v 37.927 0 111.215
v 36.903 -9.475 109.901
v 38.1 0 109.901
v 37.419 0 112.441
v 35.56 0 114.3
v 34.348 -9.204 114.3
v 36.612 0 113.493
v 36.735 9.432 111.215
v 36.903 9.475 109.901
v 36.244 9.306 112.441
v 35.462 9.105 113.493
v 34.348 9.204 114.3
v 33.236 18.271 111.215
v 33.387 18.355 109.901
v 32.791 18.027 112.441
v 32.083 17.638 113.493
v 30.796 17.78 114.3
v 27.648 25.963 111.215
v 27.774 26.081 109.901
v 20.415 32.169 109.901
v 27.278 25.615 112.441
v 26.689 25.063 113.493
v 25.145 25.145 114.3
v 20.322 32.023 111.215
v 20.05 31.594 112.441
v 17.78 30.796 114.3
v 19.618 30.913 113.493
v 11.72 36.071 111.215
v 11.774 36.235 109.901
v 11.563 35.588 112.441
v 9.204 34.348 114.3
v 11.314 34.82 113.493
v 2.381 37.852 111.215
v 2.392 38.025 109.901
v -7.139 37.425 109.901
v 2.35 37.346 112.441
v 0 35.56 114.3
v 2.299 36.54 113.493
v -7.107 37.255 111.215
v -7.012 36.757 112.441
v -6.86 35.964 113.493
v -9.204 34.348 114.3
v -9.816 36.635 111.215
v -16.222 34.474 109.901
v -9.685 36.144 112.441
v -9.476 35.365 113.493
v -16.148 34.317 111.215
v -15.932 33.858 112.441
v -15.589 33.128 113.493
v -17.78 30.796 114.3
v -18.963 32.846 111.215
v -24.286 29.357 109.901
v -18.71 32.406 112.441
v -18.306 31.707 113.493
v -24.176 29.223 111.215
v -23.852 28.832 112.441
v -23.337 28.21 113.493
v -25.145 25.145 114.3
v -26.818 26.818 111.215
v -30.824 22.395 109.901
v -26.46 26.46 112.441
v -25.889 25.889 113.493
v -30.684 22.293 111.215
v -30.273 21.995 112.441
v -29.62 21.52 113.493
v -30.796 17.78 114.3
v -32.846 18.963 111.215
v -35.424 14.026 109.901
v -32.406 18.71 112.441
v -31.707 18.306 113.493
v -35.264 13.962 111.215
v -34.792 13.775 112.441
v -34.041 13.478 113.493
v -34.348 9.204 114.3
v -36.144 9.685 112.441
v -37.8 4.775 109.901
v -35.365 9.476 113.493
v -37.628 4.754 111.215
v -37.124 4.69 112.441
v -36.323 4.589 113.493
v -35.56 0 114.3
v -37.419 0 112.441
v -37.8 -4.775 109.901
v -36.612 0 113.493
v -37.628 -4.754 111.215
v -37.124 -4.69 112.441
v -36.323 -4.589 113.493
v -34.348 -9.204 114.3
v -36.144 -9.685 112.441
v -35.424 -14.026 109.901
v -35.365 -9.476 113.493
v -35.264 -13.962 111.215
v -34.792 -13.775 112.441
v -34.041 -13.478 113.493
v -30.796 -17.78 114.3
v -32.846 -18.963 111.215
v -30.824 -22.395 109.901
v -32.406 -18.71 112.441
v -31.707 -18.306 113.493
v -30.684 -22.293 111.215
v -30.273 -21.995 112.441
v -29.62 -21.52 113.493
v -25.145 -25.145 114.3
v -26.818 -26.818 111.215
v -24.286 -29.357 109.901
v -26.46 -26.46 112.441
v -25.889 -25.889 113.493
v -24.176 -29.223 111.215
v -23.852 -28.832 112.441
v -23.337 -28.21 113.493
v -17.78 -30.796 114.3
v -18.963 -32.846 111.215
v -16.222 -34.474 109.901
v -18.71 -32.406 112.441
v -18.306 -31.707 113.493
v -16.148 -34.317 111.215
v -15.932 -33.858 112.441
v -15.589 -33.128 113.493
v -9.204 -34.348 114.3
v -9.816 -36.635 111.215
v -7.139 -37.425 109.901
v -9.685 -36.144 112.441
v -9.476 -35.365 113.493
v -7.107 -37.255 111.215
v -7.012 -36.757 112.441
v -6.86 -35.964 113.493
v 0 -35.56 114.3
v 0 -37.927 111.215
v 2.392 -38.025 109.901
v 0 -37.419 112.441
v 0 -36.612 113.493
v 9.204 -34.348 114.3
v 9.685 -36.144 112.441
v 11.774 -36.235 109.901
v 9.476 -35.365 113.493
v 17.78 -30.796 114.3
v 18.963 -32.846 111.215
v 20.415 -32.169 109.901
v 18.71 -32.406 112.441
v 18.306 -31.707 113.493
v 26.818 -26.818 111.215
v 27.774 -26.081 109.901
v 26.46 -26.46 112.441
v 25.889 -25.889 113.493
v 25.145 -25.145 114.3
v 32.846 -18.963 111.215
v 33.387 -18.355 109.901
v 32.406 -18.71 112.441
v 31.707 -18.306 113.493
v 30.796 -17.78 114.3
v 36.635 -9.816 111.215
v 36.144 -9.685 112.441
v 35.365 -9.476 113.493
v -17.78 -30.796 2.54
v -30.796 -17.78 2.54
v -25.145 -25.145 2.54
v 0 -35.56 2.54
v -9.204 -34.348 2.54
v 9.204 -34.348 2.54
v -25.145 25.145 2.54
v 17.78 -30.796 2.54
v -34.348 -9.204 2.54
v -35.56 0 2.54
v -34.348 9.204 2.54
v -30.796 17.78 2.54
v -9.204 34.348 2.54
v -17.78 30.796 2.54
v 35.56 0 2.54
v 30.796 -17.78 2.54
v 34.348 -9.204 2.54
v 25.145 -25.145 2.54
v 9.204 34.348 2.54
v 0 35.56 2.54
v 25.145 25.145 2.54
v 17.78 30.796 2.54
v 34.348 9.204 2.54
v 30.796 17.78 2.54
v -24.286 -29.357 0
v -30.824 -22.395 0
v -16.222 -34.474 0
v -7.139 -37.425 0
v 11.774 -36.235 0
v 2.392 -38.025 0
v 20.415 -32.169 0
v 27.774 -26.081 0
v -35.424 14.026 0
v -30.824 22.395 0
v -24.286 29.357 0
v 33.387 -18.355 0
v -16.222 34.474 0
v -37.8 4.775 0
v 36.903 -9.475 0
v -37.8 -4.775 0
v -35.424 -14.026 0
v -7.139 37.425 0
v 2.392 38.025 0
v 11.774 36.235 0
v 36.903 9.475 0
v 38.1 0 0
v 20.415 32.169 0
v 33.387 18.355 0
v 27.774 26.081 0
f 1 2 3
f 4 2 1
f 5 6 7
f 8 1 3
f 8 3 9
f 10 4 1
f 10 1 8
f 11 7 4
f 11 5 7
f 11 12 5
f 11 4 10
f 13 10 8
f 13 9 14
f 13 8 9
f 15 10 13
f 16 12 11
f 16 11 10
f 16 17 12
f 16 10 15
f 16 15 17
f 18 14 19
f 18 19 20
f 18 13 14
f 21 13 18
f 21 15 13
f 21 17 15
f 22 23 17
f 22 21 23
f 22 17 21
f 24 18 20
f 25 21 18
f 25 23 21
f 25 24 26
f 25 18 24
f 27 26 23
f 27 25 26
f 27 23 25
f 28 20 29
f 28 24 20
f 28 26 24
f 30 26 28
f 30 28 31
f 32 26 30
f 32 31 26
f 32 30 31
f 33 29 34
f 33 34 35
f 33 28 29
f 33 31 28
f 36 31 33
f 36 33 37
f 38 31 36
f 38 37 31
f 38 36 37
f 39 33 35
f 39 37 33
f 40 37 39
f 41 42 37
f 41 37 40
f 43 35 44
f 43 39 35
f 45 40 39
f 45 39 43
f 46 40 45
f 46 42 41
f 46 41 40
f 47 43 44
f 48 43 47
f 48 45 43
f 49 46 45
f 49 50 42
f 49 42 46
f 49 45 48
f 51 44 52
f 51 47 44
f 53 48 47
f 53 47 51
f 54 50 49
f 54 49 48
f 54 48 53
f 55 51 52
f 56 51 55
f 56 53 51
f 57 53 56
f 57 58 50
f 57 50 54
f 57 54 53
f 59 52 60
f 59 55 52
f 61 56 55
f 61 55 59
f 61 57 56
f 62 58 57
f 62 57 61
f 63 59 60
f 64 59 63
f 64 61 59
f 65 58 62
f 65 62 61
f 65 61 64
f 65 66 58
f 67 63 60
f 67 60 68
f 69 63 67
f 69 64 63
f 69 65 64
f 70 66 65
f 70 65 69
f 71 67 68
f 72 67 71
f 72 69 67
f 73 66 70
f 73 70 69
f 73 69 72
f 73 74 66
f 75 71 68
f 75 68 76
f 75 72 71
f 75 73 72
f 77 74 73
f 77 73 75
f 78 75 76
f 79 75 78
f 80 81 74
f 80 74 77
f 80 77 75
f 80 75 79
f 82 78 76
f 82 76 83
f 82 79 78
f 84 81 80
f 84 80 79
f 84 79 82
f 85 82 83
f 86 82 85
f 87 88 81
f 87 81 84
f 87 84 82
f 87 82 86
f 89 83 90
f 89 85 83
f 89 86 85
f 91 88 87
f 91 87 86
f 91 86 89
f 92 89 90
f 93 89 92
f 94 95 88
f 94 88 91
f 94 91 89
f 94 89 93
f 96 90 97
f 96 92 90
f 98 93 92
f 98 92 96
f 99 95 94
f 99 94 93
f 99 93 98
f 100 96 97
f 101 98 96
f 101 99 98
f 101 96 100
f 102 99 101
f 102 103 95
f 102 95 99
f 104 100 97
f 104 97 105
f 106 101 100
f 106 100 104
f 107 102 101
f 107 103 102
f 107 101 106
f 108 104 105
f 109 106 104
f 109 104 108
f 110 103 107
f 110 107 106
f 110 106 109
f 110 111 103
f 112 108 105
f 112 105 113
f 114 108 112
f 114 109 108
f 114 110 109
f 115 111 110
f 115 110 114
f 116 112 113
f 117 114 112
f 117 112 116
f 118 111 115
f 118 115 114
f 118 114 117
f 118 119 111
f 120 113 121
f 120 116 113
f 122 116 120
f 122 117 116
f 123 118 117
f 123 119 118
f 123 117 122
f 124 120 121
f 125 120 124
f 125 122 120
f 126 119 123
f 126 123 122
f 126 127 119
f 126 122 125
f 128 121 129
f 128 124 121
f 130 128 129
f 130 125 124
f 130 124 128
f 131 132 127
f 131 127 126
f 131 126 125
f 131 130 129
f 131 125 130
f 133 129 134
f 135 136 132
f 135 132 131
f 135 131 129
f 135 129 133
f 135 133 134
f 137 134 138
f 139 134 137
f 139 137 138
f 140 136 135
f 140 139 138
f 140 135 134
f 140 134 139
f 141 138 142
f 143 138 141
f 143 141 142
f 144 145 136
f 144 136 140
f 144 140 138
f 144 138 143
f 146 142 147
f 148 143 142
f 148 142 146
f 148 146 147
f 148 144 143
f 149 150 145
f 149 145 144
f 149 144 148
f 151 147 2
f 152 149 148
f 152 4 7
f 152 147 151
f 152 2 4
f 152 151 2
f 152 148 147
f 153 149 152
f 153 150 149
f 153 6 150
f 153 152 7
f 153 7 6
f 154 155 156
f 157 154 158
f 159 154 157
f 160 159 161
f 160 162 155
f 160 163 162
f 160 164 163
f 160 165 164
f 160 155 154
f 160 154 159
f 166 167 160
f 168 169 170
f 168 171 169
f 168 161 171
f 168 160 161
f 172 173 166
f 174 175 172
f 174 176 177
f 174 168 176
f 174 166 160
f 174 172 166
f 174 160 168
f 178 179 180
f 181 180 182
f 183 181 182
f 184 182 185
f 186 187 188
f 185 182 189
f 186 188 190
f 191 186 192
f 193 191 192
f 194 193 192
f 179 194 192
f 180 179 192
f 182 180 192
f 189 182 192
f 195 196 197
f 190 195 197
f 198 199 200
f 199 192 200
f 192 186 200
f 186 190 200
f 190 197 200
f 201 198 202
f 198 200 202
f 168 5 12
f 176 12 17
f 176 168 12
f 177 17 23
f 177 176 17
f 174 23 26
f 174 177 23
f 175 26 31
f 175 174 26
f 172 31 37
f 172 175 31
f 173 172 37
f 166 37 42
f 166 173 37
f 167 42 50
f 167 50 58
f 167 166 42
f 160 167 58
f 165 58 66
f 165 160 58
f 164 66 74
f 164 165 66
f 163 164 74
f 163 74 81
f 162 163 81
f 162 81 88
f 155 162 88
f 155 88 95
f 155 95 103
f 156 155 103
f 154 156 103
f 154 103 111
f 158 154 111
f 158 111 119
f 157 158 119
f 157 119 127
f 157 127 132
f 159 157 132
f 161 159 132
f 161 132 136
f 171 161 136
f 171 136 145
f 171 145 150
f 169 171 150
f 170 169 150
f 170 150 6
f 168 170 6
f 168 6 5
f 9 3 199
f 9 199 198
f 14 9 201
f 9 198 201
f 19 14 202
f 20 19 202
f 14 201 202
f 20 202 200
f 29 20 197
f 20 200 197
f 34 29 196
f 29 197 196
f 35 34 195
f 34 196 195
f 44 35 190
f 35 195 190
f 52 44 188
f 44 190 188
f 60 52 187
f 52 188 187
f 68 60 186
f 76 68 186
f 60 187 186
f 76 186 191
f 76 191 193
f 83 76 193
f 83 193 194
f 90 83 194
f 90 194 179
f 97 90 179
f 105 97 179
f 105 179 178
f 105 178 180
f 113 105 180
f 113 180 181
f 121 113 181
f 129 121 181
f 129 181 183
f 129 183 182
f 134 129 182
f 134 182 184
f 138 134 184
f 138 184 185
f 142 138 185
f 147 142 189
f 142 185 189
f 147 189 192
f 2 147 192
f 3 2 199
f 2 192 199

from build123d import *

# Parameters (mm, degrees)
F0_R     = 38.1
F1_DEPTH = 114.3
F2_T     = -2.54


# Not quite as in the source:
# - a fillet or chamfer that OpenCascade refuses, or shapes differently, is made with other operations: its cross-section is extruded or revolved along the edge and cut away or added


with BuildPart() as f1:
    # F0 (on Top) → F1 (new body)
    with BuildSketch(Plane.XY):
        Circle(F0_R)
    extrude(amount=F1_DEPTH)

    # F2
    f2_openings = [f1.faces().sort_by_distance(p)[0] for p in [
        (0, 0, 114.3),
    ]]
    offset(amount=F2_T, openings=f2_openings)

    # F3: fillet of radius 5.08 on 1 edges, made by hand

    # F3_s1 → F3_t2 (revolve, cut)
    with BuildSketch(Plane.XZ):
        with BuildLine():
            ThreePointArc((38.1, 109.9005909488), (37.4194090512, 112.4405909488), (35.56, 114.3))
            Line((35.56, 114.3), (38.1, 114.3))
            Line((38.1, 114.3), (38.1, 109.9005909488))
        make_face()
    revolve(axis=Axis((0, 0, 114.3), (0, 0, 1)), mode=Mode.SUBTRACT)


solid = f1.part
